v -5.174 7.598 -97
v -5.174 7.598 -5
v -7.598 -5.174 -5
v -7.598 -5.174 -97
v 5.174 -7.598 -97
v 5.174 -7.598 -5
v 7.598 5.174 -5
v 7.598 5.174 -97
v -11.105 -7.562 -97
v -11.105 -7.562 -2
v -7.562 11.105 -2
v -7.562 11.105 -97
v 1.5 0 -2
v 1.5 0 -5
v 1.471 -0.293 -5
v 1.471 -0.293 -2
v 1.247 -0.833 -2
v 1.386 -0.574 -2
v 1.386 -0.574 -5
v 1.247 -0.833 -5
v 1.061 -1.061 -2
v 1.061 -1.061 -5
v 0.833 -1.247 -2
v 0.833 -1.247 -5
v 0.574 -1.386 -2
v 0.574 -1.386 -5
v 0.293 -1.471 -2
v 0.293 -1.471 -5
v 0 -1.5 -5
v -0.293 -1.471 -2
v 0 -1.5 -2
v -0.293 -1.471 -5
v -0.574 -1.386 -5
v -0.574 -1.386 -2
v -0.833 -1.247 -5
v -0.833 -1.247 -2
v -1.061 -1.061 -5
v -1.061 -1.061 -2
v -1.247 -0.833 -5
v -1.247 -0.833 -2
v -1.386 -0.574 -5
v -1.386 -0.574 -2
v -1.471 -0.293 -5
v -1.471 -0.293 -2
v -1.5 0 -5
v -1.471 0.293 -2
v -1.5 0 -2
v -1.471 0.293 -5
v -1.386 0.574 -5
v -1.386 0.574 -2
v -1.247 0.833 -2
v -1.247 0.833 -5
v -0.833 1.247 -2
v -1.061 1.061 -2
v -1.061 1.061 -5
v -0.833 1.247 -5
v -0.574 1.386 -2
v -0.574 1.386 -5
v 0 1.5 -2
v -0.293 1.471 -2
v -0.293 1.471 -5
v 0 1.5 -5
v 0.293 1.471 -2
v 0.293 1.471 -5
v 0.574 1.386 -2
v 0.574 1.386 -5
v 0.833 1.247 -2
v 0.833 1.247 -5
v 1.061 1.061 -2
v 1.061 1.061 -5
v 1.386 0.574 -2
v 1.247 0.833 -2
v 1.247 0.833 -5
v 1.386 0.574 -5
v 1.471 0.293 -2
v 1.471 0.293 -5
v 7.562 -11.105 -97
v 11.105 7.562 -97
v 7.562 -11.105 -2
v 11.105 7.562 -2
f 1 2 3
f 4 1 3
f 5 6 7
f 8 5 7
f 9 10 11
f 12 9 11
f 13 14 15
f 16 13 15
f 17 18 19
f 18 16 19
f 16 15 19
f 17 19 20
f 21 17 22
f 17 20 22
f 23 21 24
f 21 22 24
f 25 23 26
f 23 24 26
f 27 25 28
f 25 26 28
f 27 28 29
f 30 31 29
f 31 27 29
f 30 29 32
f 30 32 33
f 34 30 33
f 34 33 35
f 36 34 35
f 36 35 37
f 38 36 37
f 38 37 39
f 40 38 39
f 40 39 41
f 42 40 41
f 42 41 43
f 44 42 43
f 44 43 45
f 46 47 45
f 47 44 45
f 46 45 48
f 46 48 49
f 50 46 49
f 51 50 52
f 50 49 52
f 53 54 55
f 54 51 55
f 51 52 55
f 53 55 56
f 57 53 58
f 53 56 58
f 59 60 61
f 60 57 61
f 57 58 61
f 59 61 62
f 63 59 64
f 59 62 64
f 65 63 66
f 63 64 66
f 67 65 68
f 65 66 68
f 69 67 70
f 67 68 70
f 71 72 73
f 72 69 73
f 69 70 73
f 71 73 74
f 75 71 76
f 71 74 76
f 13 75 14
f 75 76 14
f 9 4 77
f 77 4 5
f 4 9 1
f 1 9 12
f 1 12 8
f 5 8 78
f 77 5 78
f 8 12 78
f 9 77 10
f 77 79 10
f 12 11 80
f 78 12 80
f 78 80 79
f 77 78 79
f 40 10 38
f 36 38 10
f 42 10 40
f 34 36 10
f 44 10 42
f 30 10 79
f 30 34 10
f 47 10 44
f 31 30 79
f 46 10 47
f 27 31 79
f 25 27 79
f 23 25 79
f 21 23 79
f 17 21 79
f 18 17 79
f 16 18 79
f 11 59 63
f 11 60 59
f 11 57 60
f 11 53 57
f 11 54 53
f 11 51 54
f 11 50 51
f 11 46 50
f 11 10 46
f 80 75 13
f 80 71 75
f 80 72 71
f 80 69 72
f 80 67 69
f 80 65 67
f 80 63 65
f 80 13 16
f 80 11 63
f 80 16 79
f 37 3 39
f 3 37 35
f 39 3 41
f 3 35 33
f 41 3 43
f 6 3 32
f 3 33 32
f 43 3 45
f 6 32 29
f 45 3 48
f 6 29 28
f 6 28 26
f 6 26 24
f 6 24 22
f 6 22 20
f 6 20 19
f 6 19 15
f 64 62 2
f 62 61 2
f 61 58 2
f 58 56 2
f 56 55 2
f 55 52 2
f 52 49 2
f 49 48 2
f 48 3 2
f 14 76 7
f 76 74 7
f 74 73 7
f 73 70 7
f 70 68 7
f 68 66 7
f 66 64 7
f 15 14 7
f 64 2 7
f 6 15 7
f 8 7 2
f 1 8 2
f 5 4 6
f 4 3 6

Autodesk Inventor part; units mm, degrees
ref_plane "YZ Plane" through (0, 0, 0) normal (1, 0, 0) x (0, 1, 0)
ref_plane "XZ Plane" through (0, 0, 0) normal (0, 1, 0) x (-1, 0, 0)
ref_plane "XY Plane" through (0, 0, 0) normal (0, 0, 1) x (1, 0, 0)
sketch "Sketch1" plane through (0, 0, 0) normal (0, 0, 1) x (1, 0, 0)
  line L0 (7.598, 5.174) -> (-5.174, 7.598) projected
  line L1 (5.174, -7.598) -> (7.598, 5.174) projected
  line L2 (-7.598, -5.174) -> (5.174, -7.598) projected
  line L3 (-5.174, 7.598) -> (-7.598, -5.174) projected
  line L4 (-11.1048, -7.562) -> (-7.562, 11.1048)
  line L5 (-7.562, 11.1048) -> (11.1048, 7.562)
  line L6 (11.1048, 7.562) -> (7.562, -11.1048)
  line L7 (7.562, -11.1048) -> (-11.1048, -7.562)
  point P0 (0, 0)
  dimension "d0" = 3
  dimension "d1" = 3
  dimension "d2" = 3
  dimension "d3" = 3
ref_plane "Work Plane1" through (0, 0, -5) normal (0, 0, 1) x (1, 0, 0)
sketch "Sketch2" plane through (0, 0, -5) normal (0, 0, 1) x (1, 0, 0)
  line L0 (7.598, 5.174) -> (-5.174, 7.598) projected
  line L1 (-7.562, 11.1048) -> (11.1048, 7.562) projected
  line L2 (-11.1048, -7.562) -> (-7.562, 11.1048) projected
  line L3 (7.562, -11.1048) -> (-11.1048, -7.562) projected
  line L4 (11.1048, 7.562) -> (7.562, -11.1048) projected
  line L5 (5.174, -7.598) -> (7.598, 5.174) projected
  line L6 (-7.598, -5.174) -> (5.174, -7.598) projected
  line L7 (-5.174, 7.598) -> (-7.598, -5.174) projected
  point P0 (0, 0)
extrude "Extrusion1" add sketch "Sketch2" against normal blind 92
sketch "Sketch3" plane through (0, 0, -5) normal (0, 0, 1) x (1, 0, 0)
  line L0 (-11.1048, -7.562) -> (7.562, -11.1048) projected
  line L1 (7.562, -11.1048) -> (11.1048, 7.562) projected
  line L2 (11.1048, 7.562) -> (-7.562, 11.1048) projected
  line L3 (-7.562, 11.1048) -> (-11.1048, -7.562) projected
  line L4 (7.598, 5.174) -> (5.174, -7.598) projected
  line L5 (5.174, -7.598) -> (-7.598, -5.174) projected
  line L6 (-7.598, -5.174) -> (-5.174, 7.598) projected
  line L7 (-5.174, 7.598) -> (7.598, 5.174) projected
  circle A0 centre (0, 0) radius 1.5
  dimension "d6" = 3
extrude "Extrusion2" add sketch "Sketch3" along normal blind 3 contours L3 L2 L1 L0 | L4 L5 L6 L7
properties part number "Casing"
